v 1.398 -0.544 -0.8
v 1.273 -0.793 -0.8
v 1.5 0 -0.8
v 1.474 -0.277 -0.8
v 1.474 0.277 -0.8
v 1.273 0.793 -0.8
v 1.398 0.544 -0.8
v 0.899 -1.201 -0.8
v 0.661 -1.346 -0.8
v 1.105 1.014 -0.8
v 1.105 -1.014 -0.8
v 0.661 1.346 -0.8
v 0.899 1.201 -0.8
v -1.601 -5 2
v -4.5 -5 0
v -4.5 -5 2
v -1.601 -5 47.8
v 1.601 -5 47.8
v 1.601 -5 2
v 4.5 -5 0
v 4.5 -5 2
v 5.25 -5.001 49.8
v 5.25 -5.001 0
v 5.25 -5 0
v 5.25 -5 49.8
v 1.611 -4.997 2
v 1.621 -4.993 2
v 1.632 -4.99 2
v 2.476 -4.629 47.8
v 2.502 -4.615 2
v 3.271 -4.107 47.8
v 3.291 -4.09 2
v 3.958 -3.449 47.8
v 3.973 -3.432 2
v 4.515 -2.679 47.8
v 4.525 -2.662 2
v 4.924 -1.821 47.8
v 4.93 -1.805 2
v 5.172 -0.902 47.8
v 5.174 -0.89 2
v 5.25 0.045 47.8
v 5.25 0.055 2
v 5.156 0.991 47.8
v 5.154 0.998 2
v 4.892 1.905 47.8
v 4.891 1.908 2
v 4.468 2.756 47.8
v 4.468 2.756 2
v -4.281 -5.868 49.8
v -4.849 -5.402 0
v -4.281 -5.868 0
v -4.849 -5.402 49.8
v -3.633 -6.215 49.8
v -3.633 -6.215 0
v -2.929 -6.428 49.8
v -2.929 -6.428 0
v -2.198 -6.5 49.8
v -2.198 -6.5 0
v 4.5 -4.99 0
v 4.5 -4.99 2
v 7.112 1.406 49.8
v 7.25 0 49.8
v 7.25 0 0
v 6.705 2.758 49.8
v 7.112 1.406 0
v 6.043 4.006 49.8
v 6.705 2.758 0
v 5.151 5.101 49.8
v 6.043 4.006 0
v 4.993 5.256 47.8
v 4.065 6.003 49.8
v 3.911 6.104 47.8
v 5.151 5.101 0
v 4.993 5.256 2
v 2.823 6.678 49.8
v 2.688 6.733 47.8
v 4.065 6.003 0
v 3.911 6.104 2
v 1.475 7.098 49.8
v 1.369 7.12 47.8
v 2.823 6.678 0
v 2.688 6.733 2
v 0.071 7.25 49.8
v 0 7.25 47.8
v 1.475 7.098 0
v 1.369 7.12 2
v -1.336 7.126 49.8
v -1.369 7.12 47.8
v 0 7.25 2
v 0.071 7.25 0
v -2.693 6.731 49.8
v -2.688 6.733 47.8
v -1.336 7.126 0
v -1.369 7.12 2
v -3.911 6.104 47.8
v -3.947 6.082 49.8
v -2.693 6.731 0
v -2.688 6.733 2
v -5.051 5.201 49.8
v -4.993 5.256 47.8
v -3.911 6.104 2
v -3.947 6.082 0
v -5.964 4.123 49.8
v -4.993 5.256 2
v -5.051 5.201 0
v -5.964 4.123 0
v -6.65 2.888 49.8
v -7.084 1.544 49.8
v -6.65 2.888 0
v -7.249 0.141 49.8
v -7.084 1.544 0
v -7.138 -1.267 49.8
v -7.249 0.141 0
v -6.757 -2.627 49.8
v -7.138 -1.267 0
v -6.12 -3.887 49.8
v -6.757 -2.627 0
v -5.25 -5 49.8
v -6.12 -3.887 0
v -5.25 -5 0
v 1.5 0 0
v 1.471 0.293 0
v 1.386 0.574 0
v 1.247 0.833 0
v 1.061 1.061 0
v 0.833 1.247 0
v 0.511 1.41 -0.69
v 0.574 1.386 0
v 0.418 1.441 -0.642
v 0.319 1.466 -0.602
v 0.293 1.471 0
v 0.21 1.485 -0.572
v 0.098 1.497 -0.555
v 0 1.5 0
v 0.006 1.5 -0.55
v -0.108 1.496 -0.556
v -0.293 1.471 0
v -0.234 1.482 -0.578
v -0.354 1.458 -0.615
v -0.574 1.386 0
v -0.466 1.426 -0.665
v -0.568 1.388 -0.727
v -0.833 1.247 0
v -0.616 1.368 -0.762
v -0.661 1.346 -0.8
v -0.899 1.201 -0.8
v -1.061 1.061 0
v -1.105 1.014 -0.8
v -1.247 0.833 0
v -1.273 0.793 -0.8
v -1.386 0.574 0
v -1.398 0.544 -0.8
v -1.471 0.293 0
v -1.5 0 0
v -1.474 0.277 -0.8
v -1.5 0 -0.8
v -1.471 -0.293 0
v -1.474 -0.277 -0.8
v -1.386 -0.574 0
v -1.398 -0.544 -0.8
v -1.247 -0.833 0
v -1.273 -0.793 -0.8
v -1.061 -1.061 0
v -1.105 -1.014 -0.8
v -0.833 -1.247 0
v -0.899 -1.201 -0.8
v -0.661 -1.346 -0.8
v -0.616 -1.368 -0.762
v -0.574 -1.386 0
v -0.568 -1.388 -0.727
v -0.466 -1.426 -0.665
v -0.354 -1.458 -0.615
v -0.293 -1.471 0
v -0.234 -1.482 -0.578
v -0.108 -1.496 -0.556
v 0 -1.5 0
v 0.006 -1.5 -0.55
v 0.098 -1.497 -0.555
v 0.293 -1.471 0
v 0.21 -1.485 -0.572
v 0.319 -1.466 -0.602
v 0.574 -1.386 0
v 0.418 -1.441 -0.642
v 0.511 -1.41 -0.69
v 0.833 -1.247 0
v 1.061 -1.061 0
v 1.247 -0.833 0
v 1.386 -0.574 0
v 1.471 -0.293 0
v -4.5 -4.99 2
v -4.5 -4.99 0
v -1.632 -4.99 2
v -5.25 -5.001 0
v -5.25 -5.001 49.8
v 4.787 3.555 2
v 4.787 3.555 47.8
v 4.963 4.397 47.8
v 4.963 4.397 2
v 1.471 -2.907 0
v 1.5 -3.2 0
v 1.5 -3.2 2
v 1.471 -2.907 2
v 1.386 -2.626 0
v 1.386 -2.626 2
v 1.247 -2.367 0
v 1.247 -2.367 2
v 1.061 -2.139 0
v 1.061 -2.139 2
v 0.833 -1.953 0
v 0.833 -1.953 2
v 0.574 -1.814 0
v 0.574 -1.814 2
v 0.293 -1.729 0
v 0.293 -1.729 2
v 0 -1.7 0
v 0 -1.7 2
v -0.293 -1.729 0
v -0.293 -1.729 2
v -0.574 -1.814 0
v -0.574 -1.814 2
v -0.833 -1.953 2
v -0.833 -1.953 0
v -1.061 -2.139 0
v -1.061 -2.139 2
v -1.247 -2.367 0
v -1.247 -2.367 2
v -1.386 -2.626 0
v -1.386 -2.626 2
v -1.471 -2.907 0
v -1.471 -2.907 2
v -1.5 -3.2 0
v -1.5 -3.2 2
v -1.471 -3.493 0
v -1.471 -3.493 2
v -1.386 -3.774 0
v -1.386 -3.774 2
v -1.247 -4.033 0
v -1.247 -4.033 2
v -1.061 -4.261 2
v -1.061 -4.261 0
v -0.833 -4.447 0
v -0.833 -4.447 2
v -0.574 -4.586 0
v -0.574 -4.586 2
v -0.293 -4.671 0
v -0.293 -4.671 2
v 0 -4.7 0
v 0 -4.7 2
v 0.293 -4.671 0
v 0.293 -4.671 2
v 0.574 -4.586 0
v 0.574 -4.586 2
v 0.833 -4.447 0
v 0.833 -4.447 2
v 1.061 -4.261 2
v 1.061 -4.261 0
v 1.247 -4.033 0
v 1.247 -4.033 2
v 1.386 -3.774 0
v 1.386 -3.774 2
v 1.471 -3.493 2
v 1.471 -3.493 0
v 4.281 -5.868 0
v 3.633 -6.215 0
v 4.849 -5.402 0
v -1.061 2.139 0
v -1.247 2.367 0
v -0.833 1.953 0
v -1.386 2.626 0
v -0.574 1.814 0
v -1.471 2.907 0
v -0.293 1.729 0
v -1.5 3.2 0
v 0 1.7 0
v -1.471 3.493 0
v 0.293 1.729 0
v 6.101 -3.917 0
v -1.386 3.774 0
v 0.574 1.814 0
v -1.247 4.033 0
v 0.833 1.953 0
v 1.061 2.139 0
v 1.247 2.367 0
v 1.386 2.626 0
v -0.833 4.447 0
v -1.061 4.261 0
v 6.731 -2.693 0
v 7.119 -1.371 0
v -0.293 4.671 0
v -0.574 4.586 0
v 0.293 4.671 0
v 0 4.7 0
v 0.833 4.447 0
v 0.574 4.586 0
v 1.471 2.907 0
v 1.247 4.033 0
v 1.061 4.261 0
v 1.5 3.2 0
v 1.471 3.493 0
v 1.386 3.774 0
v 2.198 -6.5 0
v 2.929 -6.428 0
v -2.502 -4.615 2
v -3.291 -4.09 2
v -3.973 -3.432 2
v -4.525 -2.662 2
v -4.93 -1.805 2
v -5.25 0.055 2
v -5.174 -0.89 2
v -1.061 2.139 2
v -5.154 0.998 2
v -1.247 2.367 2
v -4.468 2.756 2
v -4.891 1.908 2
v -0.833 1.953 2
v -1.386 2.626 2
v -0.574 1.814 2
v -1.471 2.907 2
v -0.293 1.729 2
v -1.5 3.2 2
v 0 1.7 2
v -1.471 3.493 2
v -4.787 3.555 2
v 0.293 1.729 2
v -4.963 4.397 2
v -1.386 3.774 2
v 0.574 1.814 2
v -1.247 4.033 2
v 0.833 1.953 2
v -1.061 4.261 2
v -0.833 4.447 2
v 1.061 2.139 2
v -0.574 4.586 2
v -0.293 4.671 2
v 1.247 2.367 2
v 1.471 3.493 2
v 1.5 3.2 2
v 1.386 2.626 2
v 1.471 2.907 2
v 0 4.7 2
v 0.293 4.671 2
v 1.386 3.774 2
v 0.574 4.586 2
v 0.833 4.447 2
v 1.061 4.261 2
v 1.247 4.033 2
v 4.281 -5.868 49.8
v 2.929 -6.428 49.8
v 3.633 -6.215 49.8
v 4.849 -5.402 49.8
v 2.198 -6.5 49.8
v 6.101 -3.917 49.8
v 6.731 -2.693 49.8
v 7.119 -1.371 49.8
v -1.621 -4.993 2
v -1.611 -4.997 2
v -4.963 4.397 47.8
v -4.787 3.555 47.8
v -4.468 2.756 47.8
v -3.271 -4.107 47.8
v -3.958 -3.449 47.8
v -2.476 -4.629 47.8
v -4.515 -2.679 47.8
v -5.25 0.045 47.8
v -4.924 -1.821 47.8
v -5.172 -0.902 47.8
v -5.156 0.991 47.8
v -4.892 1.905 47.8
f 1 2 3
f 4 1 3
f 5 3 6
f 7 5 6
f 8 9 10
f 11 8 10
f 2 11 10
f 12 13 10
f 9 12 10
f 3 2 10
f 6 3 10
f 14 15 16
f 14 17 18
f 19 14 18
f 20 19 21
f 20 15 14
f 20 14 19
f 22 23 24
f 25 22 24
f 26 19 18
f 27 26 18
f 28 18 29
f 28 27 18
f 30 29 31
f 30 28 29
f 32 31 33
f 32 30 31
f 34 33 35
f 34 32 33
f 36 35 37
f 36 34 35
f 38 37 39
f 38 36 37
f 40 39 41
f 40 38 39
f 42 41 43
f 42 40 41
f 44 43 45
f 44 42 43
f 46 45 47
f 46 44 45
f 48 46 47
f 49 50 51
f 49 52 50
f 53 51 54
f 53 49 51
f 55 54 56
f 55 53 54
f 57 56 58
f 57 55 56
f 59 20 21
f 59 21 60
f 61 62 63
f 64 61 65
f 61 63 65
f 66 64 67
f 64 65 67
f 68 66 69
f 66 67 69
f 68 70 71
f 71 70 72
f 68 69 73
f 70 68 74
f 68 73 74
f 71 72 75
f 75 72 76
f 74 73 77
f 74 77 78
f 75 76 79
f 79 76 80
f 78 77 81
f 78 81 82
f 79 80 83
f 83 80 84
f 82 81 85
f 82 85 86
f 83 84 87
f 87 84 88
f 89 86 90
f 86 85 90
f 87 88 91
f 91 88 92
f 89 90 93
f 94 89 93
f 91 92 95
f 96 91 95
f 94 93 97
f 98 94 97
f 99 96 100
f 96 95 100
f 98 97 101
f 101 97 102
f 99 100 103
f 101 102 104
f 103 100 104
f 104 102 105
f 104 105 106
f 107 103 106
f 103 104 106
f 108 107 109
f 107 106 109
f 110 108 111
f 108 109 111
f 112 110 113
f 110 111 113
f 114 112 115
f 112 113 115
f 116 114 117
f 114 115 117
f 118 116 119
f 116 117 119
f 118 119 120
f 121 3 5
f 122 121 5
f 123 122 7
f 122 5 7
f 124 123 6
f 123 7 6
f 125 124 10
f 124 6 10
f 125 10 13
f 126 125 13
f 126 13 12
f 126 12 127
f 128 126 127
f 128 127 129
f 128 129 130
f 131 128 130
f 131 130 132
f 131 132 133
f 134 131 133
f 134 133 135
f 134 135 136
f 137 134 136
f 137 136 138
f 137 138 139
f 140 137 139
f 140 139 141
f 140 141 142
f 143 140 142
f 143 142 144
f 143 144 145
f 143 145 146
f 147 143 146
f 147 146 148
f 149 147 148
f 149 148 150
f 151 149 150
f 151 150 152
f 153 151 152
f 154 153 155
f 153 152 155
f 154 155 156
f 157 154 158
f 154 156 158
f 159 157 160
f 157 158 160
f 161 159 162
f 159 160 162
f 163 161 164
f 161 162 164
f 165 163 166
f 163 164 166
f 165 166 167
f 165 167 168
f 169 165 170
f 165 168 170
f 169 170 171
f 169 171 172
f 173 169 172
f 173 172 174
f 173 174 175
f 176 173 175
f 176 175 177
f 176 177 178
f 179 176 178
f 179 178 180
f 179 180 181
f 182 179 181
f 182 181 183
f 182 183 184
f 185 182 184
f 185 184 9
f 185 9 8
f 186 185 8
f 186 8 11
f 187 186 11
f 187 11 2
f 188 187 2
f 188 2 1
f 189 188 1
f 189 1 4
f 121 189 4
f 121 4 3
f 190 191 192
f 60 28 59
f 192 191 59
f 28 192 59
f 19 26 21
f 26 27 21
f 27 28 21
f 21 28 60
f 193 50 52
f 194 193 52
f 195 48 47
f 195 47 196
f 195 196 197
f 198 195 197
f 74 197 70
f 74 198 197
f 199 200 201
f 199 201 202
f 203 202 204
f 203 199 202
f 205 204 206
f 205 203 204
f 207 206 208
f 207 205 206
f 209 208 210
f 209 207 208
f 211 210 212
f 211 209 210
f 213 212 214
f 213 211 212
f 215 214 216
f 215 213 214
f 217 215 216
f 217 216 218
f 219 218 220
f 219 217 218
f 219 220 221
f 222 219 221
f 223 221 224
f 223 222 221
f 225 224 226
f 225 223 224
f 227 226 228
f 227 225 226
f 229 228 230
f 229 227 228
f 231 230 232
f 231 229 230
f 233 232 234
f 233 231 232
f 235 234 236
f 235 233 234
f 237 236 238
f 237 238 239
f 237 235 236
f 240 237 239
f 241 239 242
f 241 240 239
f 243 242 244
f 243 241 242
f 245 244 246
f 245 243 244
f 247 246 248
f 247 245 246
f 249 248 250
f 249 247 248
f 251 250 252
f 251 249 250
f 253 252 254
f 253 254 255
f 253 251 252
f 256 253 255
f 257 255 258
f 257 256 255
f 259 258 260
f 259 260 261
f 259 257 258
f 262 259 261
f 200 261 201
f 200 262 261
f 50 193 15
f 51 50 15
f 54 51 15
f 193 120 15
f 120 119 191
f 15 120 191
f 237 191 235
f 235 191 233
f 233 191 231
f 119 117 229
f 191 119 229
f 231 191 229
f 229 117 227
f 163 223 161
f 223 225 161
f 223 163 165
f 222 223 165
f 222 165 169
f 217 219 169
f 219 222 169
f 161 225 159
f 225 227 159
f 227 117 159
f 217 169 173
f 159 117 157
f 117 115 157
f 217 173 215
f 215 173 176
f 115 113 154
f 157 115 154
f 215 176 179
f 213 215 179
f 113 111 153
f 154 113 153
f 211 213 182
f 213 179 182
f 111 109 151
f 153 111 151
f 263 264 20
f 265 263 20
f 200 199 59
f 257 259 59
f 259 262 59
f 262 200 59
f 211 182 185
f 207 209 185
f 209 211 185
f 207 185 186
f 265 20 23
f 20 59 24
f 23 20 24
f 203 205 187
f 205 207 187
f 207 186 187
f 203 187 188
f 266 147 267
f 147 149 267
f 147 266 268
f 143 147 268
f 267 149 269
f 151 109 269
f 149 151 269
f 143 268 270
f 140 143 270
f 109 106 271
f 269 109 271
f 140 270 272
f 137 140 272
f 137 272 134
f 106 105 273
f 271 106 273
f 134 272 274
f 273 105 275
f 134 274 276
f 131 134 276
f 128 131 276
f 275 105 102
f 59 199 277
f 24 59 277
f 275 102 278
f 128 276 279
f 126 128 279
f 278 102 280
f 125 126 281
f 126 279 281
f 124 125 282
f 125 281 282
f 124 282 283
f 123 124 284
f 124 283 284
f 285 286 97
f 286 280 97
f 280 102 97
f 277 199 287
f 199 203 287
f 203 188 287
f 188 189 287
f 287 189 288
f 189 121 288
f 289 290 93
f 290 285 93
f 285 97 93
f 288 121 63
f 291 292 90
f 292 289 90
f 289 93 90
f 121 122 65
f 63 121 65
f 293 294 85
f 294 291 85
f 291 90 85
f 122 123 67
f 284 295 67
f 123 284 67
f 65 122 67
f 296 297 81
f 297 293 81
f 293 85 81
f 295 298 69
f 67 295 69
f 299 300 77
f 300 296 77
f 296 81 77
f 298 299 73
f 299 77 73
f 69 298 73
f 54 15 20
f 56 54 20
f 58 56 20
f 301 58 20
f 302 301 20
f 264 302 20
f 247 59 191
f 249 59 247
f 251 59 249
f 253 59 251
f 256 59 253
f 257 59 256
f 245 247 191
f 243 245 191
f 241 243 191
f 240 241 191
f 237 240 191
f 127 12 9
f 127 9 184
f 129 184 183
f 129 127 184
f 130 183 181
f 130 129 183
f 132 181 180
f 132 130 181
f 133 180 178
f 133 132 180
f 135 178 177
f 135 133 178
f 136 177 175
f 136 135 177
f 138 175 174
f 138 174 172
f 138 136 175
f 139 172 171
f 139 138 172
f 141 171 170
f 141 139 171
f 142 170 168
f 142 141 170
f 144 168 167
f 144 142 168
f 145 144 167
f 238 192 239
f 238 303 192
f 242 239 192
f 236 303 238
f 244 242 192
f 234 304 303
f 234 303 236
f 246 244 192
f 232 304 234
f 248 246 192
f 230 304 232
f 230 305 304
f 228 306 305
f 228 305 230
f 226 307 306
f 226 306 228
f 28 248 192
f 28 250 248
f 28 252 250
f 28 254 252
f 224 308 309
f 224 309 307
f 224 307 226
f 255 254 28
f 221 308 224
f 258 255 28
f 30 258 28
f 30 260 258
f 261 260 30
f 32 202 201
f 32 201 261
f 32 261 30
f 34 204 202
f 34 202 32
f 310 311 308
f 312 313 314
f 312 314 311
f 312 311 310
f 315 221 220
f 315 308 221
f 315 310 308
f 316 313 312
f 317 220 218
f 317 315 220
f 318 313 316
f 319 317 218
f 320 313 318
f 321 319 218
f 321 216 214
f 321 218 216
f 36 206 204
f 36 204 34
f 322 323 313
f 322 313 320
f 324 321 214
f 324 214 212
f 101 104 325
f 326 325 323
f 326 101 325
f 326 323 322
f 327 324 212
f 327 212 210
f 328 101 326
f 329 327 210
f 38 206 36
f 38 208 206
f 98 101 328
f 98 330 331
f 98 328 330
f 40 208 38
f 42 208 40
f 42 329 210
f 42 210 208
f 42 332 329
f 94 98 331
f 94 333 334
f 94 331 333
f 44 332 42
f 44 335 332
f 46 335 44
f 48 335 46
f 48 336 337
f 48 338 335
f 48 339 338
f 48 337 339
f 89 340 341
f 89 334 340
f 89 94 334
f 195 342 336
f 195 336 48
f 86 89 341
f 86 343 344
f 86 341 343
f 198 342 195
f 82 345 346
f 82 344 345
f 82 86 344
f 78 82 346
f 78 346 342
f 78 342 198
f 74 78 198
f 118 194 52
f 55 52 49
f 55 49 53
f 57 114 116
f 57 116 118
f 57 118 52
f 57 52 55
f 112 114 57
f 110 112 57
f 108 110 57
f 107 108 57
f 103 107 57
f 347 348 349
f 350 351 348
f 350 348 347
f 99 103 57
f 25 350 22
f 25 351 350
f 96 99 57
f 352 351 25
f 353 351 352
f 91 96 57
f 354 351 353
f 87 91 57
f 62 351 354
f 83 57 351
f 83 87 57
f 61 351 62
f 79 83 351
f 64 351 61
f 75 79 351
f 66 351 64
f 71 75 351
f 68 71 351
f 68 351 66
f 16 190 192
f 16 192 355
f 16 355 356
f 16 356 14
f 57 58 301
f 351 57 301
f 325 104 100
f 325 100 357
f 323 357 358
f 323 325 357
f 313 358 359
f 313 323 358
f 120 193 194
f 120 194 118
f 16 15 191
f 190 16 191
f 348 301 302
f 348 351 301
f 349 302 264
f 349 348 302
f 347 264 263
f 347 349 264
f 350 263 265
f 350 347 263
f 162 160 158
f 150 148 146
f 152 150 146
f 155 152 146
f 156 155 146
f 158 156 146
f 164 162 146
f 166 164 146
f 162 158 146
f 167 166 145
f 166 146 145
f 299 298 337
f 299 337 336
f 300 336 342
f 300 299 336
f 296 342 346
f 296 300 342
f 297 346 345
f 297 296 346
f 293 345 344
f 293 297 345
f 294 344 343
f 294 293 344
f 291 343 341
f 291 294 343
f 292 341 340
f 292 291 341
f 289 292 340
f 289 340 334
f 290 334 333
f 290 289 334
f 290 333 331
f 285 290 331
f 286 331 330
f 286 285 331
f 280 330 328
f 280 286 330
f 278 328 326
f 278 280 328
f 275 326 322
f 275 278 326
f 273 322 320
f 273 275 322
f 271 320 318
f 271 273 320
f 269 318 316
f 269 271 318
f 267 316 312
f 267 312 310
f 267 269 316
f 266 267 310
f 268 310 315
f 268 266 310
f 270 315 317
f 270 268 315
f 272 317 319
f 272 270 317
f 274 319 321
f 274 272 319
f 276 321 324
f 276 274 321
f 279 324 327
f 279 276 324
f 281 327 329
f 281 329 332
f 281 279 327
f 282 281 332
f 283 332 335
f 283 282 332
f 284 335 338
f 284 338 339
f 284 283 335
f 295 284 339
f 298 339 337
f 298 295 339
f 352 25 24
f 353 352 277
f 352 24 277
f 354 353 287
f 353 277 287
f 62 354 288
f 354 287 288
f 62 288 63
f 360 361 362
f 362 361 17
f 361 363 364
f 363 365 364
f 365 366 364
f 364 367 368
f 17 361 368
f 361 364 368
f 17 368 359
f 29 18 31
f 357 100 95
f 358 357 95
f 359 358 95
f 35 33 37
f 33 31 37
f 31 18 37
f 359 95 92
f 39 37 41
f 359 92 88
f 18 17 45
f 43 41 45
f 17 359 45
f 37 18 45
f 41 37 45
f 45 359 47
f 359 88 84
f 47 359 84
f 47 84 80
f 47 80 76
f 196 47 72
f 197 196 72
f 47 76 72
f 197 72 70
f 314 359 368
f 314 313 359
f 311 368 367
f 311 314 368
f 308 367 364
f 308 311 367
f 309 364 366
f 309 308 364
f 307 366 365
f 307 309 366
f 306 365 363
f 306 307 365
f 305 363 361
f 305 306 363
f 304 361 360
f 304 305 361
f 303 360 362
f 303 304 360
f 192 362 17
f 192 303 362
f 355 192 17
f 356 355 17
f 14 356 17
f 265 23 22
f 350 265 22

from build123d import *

# Parameters (mm, degrees)
CYLINDER_R        = 7.25
CYLINDER_DEPTH    = 49.8
CYLINDER003_R     = 1.5
CYLINDER003_DEPTH = 1
CYLINDER001_R     = 5.25
CYLINDER001_DEPTH = 45.8
CYLINDER002_R     = 5
CYLINDER002_DEPTH = 45.8
BOX_W             = 9
BOX_H             = 0.01
BOX_DEPTH         = 2
BOX006_W          = 9
BOX006_H          = 3
BOX006_DEPTH      = 8
BOX002_W          = 15
BOX002_H          = 10
BOX002_DEPTH      = 49.8
BOX003_W          = 10.5
BOX003_H          = 1.5
BOX003_DEPTH      = 49.8
CHAMFER_SIZE      = 1.499
FILLET_R          = 3.75
BOX004_W          = 2.75
BOX004_H          = 0.1
BOX004_DEPTH      = 5
BOX005_W          = 2.75
BOX005_H          = 0.1
BOX005_DEPTH      = 5
CYLINDER004_R     = 1
CYLINDER004_DEPTH = 4
CYLINDER005_R     = 1.5
CYLINDER005_DEPTH = 2
CYLINDER006_R     = 1.5
CYLINDER006_DEPTH = 2


with BuildPart() as part:
    # Cylinder → Cylinder (join)
    with BuildSketch(Plane.XY):
        Circle(CYLINDER_R)
    extrude(amount=CYLINDER_DEPTH)

    # Cylinder003 → Cylinder003 (join)
    with BuildSketch(Plane.XY.offset(-0.8)):
        Circle(CYLINDER003_R)
    extrude(amount=CYLINDER003_DEPTH)

    # Cylinder001 → Cylinder001 (cut)
    with BuildSketch(Plane.XY.offset(2)):
        Circle(CYLINDER001_R)
    extrude(amount=CYLINDER001_DEPTH, mode=Mode.SUBTRACT)

    # Cylinder002 → Cylinder002 (cut)
    with BuildSketch(Plane(origin=(0, 5, 2), x_dir=(1, 0, 0), z_dir=(0, 0, 1))):
        Circle(CYLINDER002_R)
    extrude(amount=CYLINDER002_DEPTH, mode=Mode.SUBTRACT)

    # Box → Box (cut)
    with BuildSketch(Plane(origin=(-4.5, -5, 0), x_dir=(1, 0, 0), z_dir=(0, 0, 1))):
        with Locations((4.5, 0.005)):
            Rectangle(BOX_W, BOX_H)
    extrude(amount=BOX_DEPTH, mode=Mode.SUBTRACT)

    # Box006 → Box006 (cut)
    with BuildSketch(Plane(origin=(-4.5, -2, 2), x_dir=(1, 0, 0), z_dir=(0, 0, 1))):
        with Locations((4.5, 1.5)):
            Rectangle(BOX006_W, BOX006_H)
    extrude(amount=BOX006_DEPTH, mode=Mode.SUBTRACT)

    # Box002 → Box002 (cut)
    with BuildSketch(Plane(origin=(-7.5, -15, 0), x_dir=(1, 0, 0), z_dir=(0, 0, 1))):
        with Locations((7.5, 5)):
            Rectangle(BOX002_W, BOX002_H)
    extrude(amount=BOX002_DEPTH, mode=Mode.SUBTRACT)

    # Box003 → Box003 (join)
    with BuildSketch(Plane(origin=(-5.25, -6.5, 0), x_dir=(1, 0, 0), z_dir=(0, 0, 1))):
        with Locations((5.25, 0.75)):
            Rectangle(BOX003_W, BOX003_H)
    extrude(amount=BOX003_DEPTH)

    # Chamfer
    chamfer_edges = [part.edges().sort_by_distance(p)[0] for p in [
        (5.25, -6.5, 24.9),
        (-5.25, -6.5, 24.9),
    ]]
    chamfer(chamfer_edges, length=CHAMFER_SIZE)

    # Fillet
    fillet_edges = [part.edges().sort_by_distance(p)[0] for p in [
        (3.751, -6.5, 24.9),
        (-3.751, -6.5, 24.9),
    ]]
    fillet(fillet_edges, radius=FILLET_R)

    # Box004 → Box004 (join)
    with BuildSketch(Plane(origin=(-5, -5, 10), x_dir=(1, 0, 0), z_dir=(0, 0, 1))):
        with Locations((1.375, 0.05)):
            Rectangle(BOX004_W, BOX004_H)
    extrude(amount=BOX004_DEPTH)

    # Box005 → Box005 (join)
    with BuildSketch(Plane(origin=(2.25, -5, 10), x_dir=(1, 0, 0), z_dir=(0, 0, 1))):
        with Locations((1.375, 0.05)):
            Rectangle(BOX005_W, BOX005_H)
    extrude(amount=BOX005_DEPTH)

    # Cylinder004 → Cylinder004 (cut)
    with BuildSketch(Plane(origin=(0, 2, -1.55), x_dir=(1, 0, 0), z_dir=(0, -1, 0))):
        Circle(CYLINDER004_R)
    extrude(amount=CYLINDER004_DEPTH, mode=Mode.SUBTRACT)

    # Cylinder005 → Cylinder005 (cut)
    with BuildSketch(Plane(origin=(0, -3.2, 0), x_dir=(1, 0, 0), z_dir=(0, 0, 1))):
        Circle(CYLINDER005_R)
    extrude(amount=CYLINDER005_DEPTH, mode=Mode.SUBTRACT)

    # Cylinder006 → Cylinder006 (cut)
    with BuildSketch(Plane(origin=(0, 3.2, 0), x_dir=(1, 0, 0), z_dir=(0, 0, 1))):
        Circle(CYLINDER006_R)
    extrude(amount=CYLINDER006_DEPTH, mode=Mode.SUBTRACT)


solid = part.part
